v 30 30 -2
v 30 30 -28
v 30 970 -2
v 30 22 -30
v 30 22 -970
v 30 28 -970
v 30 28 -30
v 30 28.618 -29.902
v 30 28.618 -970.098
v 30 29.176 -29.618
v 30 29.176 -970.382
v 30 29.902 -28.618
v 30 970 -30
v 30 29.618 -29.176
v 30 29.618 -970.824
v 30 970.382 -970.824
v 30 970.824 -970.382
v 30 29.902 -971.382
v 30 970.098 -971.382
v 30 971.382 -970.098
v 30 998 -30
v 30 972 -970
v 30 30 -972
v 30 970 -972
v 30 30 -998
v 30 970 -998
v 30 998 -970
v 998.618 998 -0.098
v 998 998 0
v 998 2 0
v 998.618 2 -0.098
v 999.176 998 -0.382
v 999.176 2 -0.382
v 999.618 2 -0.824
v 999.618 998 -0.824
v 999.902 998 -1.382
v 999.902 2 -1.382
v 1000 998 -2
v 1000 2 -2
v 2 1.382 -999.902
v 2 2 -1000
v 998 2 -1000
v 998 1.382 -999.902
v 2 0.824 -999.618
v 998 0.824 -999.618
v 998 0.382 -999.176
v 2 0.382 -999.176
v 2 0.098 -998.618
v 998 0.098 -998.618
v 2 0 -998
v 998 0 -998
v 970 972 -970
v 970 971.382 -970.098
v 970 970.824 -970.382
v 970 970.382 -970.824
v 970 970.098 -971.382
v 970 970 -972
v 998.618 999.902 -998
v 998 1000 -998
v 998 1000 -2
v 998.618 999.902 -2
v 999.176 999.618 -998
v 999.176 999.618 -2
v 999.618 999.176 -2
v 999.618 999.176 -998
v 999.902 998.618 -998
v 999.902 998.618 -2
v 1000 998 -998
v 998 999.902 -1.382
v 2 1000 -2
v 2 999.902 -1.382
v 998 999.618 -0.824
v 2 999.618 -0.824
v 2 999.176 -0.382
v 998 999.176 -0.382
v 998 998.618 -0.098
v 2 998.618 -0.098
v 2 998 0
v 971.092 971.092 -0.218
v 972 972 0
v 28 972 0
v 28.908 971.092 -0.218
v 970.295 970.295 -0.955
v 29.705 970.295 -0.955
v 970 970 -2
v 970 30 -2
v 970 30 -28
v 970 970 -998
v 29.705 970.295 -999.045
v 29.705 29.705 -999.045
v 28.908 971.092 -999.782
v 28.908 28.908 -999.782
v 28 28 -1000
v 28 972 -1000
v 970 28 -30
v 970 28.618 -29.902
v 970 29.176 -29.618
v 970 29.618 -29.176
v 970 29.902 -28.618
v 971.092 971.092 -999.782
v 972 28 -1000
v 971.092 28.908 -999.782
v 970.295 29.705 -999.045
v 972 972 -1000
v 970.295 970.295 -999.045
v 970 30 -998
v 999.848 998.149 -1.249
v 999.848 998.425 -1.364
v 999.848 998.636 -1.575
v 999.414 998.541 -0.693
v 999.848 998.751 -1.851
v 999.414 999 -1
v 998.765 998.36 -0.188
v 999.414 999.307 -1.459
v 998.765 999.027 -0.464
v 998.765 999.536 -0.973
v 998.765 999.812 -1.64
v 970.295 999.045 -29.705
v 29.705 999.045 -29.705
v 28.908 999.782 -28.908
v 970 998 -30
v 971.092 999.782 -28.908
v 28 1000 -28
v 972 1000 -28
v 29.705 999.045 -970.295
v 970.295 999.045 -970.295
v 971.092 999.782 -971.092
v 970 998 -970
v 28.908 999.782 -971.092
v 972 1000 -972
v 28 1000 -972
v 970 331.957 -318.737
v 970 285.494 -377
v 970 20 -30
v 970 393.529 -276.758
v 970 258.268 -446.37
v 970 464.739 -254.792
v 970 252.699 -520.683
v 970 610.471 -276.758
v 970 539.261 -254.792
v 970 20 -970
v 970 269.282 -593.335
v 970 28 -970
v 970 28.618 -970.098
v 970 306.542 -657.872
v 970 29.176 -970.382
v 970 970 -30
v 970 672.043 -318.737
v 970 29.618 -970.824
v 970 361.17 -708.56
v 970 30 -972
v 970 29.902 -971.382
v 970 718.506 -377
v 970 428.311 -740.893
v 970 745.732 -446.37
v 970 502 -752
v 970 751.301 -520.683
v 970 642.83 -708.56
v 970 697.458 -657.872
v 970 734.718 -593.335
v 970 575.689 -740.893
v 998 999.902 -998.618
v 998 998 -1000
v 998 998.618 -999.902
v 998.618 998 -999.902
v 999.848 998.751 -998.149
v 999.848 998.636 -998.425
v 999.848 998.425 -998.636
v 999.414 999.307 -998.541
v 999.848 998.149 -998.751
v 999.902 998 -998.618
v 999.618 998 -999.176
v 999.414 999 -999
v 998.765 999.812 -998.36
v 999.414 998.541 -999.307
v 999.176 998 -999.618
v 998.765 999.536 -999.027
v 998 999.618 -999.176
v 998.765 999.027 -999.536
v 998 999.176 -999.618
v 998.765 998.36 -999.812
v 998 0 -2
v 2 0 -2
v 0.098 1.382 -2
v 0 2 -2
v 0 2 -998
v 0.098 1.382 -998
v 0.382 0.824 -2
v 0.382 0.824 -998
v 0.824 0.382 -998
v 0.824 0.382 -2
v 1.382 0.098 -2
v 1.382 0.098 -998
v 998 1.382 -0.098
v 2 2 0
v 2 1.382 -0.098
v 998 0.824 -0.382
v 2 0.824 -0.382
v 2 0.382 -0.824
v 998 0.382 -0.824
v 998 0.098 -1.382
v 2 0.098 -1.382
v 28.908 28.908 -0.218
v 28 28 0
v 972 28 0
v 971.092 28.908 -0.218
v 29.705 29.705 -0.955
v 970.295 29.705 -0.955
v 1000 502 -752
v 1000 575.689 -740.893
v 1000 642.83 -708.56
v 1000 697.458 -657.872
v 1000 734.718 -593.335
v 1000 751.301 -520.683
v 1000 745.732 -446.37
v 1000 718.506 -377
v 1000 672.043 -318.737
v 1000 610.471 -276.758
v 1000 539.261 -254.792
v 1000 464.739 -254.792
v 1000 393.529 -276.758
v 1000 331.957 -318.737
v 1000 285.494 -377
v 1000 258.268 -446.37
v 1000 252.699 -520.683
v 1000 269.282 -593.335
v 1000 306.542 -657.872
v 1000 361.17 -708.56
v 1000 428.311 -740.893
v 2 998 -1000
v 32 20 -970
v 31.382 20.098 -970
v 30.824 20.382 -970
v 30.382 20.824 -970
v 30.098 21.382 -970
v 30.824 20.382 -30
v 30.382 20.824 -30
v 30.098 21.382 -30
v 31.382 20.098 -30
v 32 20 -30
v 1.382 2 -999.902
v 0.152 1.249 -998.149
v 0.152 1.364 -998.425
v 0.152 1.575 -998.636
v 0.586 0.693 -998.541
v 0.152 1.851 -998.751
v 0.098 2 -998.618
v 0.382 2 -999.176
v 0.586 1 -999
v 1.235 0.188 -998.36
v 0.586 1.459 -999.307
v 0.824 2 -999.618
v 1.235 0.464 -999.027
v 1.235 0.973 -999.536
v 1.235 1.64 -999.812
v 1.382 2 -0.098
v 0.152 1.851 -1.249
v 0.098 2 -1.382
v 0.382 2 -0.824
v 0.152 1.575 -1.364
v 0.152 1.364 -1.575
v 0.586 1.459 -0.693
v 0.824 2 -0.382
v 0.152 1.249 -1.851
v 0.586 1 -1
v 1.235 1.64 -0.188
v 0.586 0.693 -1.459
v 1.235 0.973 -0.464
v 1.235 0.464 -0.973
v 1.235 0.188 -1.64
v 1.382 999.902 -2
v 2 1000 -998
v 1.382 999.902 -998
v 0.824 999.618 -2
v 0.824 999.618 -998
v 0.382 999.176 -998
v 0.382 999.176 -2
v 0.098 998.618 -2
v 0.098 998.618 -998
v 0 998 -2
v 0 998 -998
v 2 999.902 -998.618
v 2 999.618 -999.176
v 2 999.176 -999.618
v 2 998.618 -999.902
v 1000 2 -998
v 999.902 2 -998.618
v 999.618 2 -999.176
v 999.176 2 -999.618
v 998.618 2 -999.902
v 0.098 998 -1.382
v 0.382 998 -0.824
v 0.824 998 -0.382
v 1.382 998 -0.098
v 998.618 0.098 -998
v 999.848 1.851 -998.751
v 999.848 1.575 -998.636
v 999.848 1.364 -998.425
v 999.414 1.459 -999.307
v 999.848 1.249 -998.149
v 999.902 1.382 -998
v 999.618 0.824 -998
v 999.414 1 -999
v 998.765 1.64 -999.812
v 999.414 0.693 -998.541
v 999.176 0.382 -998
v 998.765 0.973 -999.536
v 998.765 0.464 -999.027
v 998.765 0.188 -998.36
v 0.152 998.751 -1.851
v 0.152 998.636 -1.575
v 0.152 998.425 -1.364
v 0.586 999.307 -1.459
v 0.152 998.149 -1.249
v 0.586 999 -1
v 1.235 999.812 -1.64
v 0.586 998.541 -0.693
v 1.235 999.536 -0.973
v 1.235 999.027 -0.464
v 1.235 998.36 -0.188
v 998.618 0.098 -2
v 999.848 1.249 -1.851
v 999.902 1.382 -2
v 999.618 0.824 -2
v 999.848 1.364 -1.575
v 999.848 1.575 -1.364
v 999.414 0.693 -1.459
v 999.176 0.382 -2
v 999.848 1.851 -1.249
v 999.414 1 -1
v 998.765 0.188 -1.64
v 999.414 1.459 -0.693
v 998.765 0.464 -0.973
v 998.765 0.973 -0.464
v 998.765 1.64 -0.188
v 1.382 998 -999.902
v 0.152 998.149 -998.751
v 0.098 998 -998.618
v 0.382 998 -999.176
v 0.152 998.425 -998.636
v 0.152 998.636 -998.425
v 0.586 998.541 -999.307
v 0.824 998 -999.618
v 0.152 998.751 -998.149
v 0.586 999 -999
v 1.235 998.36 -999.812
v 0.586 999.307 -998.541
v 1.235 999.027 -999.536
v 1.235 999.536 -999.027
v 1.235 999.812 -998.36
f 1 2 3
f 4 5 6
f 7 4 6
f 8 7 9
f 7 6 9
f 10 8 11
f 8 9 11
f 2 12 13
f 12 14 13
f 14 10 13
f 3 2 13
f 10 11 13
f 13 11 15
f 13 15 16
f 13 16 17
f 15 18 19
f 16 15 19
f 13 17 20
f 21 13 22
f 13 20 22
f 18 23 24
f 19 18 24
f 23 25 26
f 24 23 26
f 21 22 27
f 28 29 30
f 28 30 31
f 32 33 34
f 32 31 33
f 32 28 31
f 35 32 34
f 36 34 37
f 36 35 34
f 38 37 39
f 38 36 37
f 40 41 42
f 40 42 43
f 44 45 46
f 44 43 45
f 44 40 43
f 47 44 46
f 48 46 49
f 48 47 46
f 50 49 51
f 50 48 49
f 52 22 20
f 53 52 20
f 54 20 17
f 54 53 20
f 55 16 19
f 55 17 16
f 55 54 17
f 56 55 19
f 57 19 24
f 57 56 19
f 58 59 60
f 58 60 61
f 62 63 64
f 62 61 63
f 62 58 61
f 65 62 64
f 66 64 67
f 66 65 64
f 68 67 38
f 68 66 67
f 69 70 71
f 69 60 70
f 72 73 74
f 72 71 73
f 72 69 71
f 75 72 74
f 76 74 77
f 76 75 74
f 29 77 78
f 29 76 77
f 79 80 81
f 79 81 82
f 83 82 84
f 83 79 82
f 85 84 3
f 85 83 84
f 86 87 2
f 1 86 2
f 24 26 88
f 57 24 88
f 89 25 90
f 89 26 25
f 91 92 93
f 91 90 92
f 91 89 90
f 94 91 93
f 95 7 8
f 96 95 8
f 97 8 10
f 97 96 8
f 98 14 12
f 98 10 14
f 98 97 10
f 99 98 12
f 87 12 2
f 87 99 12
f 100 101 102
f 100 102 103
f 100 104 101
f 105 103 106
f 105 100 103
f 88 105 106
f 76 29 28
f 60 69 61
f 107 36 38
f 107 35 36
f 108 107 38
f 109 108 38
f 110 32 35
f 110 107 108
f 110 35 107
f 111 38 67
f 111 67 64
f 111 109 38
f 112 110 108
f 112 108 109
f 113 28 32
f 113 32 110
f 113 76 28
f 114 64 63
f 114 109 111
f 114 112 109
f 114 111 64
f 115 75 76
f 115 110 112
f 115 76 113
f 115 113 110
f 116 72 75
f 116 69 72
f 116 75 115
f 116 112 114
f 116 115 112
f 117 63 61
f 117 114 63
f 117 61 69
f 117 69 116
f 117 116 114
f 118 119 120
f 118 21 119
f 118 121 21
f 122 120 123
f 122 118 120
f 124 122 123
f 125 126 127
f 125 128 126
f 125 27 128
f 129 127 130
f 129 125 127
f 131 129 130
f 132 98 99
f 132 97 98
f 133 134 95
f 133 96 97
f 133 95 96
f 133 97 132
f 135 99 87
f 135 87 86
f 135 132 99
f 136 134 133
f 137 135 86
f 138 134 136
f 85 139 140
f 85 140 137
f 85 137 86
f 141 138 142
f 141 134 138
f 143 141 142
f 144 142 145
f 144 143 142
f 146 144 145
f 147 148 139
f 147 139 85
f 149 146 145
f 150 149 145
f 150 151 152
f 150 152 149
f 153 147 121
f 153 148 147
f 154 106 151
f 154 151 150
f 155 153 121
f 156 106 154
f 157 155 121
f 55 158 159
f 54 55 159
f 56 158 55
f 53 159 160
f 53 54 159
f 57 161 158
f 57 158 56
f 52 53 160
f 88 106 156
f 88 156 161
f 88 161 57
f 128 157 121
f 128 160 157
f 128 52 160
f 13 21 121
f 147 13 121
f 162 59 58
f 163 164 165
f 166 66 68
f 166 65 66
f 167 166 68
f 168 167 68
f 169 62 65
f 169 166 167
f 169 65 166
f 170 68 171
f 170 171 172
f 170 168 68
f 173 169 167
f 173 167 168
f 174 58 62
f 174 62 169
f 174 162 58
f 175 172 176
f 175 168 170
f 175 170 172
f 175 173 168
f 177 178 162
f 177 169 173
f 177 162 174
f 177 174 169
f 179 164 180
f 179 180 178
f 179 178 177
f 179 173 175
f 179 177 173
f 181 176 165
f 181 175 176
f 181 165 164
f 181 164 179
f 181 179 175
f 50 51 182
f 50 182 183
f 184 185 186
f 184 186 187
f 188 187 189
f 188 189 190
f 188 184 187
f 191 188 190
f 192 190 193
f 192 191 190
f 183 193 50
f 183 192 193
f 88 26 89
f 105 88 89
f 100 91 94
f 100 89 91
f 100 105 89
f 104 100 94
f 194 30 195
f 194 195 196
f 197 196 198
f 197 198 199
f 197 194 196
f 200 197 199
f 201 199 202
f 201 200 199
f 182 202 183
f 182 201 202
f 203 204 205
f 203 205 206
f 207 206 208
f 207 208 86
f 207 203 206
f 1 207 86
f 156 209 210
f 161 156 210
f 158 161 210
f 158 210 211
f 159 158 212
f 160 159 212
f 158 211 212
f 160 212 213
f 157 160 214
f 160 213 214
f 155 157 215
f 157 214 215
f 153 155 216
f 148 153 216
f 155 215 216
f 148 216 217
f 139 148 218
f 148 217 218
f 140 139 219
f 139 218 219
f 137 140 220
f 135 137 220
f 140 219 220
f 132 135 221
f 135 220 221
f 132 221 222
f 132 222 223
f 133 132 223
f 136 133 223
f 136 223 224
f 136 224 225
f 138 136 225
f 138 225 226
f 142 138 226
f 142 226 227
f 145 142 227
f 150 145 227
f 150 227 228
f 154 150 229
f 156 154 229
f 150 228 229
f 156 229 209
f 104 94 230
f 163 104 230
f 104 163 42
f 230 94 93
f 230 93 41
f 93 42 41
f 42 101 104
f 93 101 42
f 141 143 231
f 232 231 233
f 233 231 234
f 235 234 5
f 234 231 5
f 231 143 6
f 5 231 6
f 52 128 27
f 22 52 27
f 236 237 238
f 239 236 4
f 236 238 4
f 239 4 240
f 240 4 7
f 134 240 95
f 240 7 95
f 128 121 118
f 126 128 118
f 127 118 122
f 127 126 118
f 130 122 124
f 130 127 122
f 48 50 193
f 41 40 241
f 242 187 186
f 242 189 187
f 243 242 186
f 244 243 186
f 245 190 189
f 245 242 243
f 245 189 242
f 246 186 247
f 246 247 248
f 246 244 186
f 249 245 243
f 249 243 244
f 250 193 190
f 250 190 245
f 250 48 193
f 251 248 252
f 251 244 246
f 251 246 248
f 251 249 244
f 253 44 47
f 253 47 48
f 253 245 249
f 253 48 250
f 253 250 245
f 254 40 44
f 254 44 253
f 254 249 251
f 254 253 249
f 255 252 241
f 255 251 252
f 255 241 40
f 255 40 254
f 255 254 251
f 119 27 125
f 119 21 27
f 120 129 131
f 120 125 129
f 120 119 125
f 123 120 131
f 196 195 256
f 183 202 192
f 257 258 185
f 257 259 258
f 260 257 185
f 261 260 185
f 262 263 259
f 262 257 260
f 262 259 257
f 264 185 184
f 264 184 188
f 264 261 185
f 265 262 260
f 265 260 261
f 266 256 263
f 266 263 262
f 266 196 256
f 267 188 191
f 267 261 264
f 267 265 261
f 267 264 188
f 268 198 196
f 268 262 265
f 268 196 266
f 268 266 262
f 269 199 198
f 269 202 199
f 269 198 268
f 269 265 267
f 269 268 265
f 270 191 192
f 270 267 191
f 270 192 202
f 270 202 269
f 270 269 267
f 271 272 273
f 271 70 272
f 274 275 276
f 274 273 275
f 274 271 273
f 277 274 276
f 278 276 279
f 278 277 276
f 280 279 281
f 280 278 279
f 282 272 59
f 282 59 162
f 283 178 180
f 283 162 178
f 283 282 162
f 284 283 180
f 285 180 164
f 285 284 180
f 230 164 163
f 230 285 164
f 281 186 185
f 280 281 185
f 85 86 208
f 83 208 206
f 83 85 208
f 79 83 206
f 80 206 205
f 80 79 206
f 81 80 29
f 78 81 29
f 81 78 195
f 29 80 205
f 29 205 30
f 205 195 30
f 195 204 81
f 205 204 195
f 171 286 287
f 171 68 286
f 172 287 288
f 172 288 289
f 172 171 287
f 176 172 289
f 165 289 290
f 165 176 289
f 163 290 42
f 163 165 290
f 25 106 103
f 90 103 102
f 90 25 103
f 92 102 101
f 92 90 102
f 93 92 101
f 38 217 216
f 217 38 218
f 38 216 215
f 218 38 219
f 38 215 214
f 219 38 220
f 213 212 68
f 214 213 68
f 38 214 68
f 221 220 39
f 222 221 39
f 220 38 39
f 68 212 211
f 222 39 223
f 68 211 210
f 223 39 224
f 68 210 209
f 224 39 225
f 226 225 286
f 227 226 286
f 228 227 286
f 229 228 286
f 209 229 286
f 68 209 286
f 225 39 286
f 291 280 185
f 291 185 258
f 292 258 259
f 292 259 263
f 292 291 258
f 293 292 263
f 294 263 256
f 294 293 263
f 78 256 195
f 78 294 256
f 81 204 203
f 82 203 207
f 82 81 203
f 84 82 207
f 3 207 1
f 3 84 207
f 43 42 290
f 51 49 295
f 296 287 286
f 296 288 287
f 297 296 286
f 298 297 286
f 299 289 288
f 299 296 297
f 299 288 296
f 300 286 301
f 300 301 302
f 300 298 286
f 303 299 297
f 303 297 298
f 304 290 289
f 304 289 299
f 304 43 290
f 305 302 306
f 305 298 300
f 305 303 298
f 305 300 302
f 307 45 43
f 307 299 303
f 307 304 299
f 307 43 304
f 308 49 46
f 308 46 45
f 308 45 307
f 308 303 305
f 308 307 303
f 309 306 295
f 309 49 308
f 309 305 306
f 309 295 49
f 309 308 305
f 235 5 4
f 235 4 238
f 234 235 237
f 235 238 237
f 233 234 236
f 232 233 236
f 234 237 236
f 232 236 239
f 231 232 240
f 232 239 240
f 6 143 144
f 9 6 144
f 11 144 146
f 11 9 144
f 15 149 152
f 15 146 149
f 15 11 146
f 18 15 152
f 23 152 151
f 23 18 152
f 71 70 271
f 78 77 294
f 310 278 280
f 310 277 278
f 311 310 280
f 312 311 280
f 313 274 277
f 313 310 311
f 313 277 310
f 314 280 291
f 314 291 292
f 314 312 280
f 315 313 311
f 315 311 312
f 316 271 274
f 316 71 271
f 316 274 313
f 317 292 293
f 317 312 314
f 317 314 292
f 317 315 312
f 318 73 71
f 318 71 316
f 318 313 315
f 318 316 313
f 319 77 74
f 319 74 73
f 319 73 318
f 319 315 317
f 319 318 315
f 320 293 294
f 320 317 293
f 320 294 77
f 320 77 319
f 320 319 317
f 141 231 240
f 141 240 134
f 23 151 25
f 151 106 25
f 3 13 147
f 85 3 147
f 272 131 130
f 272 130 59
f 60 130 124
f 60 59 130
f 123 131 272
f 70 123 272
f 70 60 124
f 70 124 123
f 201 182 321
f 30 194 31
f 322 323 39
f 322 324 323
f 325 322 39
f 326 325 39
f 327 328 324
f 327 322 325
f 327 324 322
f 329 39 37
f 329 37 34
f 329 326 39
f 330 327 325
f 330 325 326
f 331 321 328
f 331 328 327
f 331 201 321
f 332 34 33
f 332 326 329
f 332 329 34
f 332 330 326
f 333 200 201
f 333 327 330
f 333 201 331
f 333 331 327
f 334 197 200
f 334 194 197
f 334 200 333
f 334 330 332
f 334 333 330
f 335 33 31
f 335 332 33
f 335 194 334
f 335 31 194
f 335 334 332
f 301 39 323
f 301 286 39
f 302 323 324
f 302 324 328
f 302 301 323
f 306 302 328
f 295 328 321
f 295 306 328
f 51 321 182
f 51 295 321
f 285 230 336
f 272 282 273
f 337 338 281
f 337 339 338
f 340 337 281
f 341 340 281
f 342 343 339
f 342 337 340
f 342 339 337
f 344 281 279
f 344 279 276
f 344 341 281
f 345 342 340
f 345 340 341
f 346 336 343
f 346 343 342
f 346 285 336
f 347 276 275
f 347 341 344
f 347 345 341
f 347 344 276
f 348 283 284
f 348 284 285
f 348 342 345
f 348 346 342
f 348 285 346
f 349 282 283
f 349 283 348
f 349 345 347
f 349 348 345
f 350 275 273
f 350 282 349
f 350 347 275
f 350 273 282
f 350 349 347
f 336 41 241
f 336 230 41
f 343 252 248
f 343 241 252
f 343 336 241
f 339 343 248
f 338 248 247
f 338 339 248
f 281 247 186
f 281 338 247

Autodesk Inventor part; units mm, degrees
ref_plane "YZ Plane" through (0, 0, 0) normal (1, 0, 0) x (0, 1, 0)
ref_plane "XZ Plane" through (0, 0, 0) normal (0, 1, 0) x (-1, 0, 0)
ref_plane "XY Plane" through (0, 0, 0) normal (0, 0, 1) x (1, 0, 0)
sketch "Sketch2" plane through (0, 0, 0) normal (0, 1, 0) x (-1, 0, 0)
  line L0 (0, 0) -> (-1000, 0)
  line L1 (-1000, 0) -> (-1000, -1000)
  line L2 (-1000, -1000) -> (0, -1000)
  line L3 (0, -1000) -> (0, 0)
  dimension "d0" = 1000
  dimension "d1" = 1000
extrude "Extrusion1" add sketch "Sketch2" along normal blind 1000
shell "Shell1" thickness 30 removed faces 0
sketch "Sketch3" plane through (0, 1000, 0) normal (0, 1, 0) x (1, 0, 0)
  line L0 (30, 30) -> (970, 30) projected
  line L1 (970, 30) -> (970, 970) projected
  line L2 (30, 30) -> (970, 30)
  line L3 (970, 30) -> (970, 970)
  line L4 (970, 970) -> (30, 970)
  line L5 (30, 970) -> (30, 30)
  point P0 (0, 0)
extrude "Extrusion2" cut sketch "Sketch3" against normal blind 980
sketch "Sketch4" plane through (1000, 0, -1000) normal (0, 0, -1) x (-1, 0, 0)
  line L0 (30, 20) -> (30, 1000) projected
  line L1 (30, 30) -> (970, 30)
  line L2 (970, 30) -> (970, 970)
  line L3 (970, 970) -> (30, 970)
  line L4 (30, 970) -> (30, 30)
  line L5 (0, 0) -> (0, 1000) projected
  line L6 (0, 1000) -> (1000, 1000) projected
  point P0 (1000, 0)
  point P1 (30, 970)
  dimension "d7" = 940
  dimension "d8" = 940
  dimension "d9" = 30
  dimension "d10" = 30
extrude "Extrusion3" cut sketch "Sketch4" against normal blind 1000
fillet "Fillet1" radius 2 28 edges at (500, 1000, -1000) (500, 1000, 0) (500, 0, -1000) (500, 0, 0) (0, 500, 0) (0, 1000, -500) (0, 500, -1000) (500, 1000, -30) (30, 1000, -500) (500, 1000, -970) (500, 970, -970) (500, 30, -1000) (500, 30, -970) (500, 30, -30) (500, 30, 0) (500, 970, 0) (30, 500, 0) (30, 500, -1000) (0, 0, -500) (1000, 0, -500) (970, 500, 0) (1000, 500, 0) (970, 500, -1000) (1000, 500, -1000) (970, 1000, -500) (1000, 1000, -500) (500, 970, -1000) (30, 20, -500)
sketch "Sketch5" plane through (1000, 2, -2) normal (1, 0, 0) x (0, 0, -1)
  circle A0 centre (500, 500) radius 250
  line L0 (996, 0) -> (0, 0) projected
  line L1 (0, 0) -> (0, 996) projected
  point P0 (-2, -2)
  dimension "d14" = 500
  dimension "d15" = 500
  dimension "d16" = 500
extrude "Extrusion4" cut sketch "Sketch5" against normal blind 100
properties part number "Body_prototype2"
